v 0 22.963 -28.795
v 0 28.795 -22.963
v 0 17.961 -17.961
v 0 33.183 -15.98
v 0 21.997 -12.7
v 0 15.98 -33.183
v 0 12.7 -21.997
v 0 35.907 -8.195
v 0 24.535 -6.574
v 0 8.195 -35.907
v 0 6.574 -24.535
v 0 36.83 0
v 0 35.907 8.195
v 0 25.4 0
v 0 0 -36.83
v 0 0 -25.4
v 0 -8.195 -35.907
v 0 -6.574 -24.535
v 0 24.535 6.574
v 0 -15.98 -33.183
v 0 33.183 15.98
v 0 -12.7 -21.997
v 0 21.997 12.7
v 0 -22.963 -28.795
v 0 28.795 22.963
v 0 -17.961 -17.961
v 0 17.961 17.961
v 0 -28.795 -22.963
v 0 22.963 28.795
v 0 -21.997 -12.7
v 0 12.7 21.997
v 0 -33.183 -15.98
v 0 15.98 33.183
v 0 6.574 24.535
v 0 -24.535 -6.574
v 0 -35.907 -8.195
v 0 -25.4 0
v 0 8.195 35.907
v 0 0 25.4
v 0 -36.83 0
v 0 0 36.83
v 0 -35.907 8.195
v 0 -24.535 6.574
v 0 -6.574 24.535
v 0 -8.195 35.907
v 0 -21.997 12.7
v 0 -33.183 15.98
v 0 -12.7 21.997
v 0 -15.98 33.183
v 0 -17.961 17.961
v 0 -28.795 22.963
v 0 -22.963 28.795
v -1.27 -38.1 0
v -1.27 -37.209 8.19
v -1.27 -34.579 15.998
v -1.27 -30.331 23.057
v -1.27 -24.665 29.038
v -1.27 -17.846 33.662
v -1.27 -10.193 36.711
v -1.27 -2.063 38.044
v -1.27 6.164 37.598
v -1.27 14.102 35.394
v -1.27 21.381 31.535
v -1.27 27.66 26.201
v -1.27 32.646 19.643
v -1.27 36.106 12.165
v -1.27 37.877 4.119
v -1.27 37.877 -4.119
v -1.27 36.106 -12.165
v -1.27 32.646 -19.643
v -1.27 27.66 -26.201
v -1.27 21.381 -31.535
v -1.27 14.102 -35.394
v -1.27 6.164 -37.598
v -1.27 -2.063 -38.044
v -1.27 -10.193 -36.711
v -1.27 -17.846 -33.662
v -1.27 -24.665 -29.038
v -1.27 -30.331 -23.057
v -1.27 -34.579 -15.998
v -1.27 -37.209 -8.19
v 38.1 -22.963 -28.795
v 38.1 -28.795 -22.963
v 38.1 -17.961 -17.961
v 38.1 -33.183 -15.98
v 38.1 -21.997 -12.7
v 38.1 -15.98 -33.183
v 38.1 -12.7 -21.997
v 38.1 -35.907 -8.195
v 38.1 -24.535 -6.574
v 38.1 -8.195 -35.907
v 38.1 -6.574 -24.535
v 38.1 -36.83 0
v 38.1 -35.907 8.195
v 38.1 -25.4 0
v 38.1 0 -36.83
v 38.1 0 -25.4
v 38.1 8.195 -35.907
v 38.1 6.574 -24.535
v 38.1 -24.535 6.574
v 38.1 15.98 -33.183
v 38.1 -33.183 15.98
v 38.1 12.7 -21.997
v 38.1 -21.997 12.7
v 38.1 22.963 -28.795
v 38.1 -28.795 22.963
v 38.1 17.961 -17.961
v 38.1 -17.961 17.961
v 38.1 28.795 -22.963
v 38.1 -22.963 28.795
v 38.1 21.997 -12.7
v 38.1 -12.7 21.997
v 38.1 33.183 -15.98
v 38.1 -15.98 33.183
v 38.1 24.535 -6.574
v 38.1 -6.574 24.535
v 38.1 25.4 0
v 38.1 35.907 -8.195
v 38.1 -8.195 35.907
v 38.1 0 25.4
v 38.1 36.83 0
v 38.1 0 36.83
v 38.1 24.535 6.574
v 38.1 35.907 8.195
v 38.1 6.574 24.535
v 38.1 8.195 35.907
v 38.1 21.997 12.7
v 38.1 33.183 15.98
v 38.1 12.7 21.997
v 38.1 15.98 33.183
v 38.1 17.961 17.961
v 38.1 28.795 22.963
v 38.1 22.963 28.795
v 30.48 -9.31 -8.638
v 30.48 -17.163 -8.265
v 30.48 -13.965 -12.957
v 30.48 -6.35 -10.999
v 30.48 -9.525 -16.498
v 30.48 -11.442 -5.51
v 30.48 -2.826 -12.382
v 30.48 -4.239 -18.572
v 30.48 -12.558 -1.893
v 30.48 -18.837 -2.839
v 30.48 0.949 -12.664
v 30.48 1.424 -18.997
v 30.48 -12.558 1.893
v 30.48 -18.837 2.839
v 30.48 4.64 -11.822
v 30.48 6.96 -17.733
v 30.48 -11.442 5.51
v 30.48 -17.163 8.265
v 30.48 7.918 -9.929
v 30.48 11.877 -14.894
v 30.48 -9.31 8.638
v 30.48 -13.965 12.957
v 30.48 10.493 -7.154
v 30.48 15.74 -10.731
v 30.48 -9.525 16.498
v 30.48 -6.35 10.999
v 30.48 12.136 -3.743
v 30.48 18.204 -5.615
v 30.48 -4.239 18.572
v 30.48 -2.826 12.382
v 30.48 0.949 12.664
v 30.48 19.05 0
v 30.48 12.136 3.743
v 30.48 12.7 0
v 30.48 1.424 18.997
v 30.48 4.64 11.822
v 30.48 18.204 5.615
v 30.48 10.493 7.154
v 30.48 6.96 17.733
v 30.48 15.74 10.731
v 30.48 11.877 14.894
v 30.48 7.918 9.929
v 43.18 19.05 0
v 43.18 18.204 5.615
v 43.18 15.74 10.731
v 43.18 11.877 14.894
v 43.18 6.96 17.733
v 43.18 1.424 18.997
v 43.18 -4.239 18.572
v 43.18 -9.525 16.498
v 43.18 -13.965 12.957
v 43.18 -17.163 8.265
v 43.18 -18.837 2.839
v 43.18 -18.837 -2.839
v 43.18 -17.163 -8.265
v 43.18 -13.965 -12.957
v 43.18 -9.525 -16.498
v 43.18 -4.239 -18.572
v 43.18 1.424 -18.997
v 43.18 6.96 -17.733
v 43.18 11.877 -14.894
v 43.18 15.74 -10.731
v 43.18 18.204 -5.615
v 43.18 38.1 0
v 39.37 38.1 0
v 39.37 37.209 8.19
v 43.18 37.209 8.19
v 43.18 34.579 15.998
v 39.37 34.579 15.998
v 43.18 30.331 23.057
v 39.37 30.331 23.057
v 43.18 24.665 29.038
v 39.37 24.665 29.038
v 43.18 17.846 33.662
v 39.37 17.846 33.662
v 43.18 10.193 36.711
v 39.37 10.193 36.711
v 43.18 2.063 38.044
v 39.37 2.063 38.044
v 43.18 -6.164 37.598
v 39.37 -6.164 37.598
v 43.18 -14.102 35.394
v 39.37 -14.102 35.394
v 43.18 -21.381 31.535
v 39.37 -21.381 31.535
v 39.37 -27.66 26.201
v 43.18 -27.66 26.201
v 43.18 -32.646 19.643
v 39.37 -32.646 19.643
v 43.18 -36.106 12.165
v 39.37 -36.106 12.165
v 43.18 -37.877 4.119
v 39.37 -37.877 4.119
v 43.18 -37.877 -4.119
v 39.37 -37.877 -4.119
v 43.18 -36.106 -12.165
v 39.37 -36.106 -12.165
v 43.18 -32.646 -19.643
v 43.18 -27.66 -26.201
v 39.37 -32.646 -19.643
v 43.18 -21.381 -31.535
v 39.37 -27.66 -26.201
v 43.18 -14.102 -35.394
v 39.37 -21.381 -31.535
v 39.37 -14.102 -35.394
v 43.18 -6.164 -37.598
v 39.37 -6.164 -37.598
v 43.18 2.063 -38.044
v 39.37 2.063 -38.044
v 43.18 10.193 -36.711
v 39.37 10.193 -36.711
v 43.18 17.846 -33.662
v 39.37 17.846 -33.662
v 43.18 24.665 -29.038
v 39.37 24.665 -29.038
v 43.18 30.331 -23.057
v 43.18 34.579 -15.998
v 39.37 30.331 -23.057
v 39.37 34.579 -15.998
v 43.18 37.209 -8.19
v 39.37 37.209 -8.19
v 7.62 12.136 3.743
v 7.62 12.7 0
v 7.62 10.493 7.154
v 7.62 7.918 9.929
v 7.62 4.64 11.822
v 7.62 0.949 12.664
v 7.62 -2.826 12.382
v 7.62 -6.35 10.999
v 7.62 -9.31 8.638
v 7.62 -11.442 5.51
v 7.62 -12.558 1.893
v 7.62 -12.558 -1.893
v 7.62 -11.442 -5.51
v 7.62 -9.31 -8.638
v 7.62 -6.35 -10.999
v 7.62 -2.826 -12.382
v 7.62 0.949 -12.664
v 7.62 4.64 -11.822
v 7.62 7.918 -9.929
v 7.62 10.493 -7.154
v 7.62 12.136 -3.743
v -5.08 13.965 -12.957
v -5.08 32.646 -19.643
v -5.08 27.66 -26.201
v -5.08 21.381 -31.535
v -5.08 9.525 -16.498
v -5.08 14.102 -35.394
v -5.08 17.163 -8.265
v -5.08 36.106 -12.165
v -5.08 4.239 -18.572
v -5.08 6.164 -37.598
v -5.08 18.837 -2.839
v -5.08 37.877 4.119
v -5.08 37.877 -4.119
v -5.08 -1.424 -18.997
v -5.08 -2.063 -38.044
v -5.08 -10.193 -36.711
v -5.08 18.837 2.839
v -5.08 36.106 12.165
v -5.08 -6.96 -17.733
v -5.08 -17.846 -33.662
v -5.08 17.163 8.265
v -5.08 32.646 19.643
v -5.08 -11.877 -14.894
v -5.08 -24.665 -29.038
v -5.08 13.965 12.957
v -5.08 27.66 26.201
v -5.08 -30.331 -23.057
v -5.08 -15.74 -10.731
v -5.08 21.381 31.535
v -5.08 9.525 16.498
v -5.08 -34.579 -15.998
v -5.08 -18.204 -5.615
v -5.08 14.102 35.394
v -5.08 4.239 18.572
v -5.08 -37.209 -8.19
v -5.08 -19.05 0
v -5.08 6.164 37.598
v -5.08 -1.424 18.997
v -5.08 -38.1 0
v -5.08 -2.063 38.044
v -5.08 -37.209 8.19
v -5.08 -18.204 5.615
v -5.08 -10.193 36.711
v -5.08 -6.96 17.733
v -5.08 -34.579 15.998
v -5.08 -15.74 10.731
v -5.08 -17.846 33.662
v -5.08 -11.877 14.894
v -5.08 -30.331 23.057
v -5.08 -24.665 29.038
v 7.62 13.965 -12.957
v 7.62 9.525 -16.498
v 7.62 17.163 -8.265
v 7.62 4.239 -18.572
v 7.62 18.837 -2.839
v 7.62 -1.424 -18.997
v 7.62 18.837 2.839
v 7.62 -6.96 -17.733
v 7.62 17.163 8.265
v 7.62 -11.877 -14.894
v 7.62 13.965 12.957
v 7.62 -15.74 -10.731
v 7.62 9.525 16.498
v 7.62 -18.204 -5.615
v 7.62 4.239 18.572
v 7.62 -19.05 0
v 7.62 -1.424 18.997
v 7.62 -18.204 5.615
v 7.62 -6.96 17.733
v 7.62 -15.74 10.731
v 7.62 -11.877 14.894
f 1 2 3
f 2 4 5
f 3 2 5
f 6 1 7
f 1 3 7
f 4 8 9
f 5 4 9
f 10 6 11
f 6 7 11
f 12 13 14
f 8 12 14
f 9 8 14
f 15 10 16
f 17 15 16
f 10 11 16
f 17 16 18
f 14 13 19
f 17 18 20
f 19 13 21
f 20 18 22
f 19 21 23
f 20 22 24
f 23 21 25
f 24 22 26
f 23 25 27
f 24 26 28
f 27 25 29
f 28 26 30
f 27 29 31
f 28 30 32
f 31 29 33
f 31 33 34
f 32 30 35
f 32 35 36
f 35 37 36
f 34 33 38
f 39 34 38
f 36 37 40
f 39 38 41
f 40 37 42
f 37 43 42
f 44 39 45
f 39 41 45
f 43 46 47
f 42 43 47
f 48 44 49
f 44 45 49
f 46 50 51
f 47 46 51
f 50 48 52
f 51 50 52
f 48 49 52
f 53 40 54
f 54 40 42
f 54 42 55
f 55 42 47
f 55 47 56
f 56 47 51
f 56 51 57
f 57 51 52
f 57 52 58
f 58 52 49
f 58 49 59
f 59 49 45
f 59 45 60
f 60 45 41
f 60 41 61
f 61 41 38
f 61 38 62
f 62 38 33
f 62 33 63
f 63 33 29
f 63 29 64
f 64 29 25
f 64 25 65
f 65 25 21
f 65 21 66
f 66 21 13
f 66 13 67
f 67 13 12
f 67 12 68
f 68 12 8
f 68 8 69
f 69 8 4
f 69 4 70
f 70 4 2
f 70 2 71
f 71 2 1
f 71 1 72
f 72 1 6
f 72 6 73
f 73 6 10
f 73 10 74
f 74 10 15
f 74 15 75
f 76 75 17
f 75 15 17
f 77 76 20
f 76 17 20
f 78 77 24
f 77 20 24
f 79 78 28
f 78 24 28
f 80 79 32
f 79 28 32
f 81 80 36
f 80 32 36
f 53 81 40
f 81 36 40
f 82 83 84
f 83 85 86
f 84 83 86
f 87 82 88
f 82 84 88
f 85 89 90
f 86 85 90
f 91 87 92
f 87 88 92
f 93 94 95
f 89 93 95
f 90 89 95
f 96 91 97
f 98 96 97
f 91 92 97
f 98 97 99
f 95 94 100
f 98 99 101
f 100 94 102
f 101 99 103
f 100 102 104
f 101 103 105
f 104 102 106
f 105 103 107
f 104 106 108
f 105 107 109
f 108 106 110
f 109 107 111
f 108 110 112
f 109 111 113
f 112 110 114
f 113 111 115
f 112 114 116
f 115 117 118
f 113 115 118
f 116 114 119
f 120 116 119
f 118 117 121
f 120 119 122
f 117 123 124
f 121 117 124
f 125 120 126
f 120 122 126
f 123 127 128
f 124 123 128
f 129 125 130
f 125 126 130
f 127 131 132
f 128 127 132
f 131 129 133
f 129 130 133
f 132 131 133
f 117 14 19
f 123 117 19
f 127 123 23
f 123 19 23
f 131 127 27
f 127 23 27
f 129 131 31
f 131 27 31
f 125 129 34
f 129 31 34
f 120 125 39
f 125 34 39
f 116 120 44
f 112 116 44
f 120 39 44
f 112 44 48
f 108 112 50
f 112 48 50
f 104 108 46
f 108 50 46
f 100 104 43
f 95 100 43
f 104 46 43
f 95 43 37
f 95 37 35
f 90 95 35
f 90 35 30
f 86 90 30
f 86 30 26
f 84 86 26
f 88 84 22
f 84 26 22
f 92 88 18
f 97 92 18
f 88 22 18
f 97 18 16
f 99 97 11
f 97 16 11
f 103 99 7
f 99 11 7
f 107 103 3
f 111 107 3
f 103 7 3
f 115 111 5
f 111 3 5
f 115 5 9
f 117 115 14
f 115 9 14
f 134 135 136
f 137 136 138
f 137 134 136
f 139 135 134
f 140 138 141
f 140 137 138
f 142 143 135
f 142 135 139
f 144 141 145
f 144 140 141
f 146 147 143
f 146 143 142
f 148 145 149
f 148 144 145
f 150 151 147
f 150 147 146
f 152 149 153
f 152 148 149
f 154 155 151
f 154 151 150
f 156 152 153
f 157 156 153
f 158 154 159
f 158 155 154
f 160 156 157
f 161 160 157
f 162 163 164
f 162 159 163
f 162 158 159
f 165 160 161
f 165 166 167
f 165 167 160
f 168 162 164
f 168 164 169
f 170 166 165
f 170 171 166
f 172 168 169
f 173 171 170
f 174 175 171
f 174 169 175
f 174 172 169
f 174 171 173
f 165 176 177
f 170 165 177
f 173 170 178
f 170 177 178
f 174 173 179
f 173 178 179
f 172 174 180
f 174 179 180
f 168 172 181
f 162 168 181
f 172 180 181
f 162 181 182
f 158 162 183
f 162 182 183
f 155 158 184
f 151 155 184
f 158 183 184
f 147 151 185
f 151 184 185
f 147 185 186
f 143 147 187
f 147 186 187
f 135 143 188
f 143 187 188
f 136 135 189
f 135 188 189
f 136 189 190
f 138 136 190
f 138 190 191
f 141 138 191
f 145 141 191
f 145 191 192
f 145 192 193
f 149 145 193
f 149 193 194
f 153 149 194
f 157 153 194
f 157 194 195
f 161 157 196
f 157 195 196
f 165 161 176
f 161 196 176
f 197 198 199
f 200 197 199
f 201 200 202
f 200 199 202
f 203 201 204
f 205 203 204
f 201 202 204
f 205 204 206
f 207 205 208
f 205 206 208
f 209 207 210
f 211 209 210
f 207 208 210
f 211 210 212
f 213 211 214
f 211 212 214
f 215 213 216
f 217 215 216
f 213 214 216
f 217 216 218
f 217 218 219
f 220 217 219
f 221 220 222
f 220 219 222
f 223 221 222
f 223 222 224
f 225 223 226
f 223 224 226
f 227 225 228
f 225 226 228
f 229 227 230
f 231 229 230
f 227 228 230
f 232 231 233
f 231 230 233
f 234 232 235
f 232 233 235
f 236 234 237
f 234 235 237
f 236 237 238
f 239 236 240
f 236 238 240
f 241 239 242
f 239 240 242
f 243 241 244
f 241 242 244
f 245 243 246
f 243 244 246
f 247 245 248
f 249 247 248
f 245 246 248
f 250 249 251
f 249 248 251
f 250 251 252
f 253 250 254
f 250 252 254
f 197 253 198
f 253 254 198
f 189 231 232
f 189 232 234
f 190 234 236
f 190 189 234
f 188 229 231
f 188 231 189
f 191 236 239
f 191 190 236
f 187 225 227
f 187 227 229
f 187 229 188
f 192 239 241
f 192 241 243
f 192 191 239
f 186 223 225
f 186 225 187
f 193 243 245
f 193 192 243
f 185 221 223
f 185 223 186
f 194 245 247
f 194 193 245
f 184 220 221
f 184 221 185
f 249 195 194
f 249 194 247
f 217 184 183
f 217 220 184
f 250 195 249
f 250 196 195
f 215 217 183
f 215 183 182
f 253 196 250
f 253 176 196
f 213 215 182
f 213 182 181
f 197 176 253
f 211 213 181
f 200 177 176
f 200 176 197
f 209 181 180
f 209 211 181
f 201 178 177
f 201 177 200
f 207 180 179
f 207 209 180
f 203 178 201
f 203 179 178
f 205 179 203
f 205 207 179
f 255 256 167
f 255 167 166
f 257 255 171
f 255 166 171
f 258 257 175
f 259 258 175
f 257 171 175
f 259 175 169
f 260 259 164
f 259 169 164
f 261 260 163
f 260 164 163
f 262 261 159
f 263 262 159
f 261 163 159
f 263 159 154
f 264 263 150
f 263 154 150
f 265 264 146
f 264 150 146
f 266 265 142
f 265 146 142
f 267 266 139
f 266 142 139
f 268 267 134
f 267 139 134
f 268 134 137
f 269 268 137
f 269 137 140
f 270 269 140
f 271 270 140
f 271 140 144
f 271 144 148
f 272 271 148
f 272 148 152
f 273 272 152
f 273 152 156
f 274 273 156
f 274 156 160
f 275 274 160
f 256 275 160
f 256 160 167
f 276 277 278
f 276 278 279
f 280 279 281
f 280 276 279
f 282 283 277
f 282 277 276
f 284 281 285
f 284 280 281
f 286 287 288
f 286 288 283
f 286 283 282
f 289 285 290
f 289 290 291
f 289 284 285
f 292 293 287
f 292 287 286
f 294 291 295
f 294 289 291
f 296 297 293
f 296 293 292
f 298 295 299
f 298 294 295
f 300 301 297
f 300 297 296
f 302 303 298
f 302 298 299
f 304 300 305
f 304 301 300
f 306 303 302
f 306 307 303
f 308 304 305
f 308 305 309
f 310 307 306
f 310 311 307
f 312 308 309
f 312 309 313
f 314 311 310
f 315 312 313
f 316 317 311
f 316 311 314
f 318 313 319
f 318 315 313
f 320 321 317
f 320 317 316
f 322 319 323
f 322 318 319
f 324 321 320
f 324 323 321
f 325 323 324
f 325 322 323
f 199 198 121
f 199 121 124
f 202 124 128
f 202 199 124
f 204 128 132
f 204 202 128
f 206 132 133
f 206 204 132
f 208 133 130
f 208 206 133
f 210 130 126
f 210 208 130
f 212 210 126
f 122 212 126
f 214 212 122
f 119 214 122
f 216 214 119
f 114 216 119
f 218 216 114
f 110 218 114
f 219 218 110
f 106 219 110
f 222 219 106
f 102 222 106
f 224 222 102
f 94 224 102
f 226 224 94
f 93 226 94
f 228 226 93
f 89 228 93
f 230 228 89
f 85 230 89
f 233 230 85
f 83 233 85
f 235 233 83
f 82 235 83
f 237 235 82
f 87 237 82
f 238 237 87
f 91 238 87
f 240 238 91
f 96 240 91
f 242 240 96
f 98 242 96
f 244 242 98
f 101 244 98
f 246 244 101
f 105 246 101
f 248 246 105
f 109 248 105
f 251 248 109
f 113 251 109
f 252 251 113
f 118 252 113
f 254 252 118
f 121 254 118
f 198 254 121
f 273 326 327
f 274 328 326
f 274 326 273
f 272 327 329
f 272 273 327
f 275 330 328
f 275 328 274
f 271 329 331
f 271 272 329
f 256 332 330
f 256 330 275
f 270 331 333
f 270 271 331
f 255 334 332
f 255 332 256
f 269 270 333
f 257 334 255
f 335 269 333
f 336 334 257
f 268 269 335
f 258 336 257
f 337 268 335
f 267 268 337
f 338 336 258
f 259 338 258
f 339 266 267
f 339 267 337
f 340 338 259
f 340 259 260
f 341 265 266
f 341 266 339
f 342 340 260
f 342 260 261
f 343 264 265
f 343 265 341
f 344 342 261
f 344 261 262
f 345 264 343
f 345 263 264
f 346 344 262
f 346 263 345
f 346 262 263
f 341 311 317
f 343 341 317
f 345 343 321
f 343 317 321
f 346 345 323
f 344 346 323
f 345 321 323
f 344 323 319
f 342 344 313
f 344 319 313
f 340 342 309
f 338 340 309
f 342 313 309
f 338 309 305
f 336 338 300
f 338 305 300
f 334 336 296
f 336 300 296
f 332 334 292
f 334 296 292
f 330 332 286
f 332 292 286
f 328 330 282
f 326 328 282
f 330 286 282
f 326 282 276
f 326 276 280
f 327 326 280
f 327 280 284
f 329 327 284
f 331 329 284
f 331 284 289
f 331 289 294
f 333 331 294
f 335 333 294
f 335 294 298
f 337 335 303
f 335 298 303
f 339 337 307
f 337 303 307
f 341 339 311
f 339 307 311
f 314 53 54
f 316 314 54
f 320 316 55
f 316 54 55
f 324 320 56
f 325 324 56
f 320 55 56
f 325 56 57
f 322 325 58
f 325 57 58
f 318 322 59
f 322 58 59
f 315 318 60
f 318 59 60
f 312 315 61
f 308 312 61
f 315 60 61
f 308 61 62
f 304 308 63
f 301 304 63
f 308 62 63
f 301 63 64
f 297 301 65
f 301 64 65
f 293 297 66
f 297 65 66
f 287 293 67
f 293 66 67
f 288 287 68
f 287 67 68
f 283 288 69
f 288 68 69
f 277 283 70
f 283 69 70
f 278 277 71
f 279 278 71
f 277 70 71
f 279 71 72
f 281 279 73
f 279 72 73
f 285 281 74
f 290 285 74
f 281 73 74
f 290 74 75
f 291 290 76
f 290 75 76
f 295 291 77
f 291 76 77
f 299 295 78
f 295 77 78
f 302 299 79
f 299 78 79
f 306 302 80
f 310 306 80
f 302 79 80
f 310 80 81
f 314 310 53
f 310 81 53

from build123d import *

# Parameters (mm, degrees)
F0_R      = 25.4
F1_DEPTH  = 38.1
F2_R      = 38.1
F2_R_2    = 25.4
F3_DEPTH  = 5.08
F4_R      = 38.1
F5_DEPTH  = 5.08
F6_R      = 19.05
F3_FACE_R = 38.1
F7_DEPTH  = 12.7
F8_R      = 19.05
F9_DEPTH  = 12.7
F10_R     = 12.7
F11_DEPTH = 35.561
F12_SIZE  = 1.27


with BuildPart() as f1:
    # F0 (on Right) → F1 (new body)
    with BuildSketch(Plane.YZ):
        Circle(F0_R)
    extrude(amount=F1_DEPTH)

    # F2 (on face) → F3 (join)
    with BuildSketch(Plane.YZ.offset(38.1)):
        Circle(F2_R)
        Circle(F2_R_2, mode=Mode.SUBTRACT)
        Circle(F2_R_2)
    extrude(amount=F3_DEPTH)

    # F4 (on face) → F5 (join)
    with BuildSketch(Plane(origin=(0, 0, 0), x_dir=(0, -1, 0), z_dir=(-1, 0, 0))):
        Circle(F4_R)
    extrude(amount=F5_DEPTH)

    # F6 (on face) + F3_face (on face) → F7 (cut)
    with BuildSketch(Plane(origin=(-5.08, 0, 0), x_dir=(0, -1, 0), z_dir=(-1, 0, 0))):
        Circle(F6_R)
    with BuildSketch(Plane.YZ.offset(43.18)):
        Circle(F3_FACE_R)
    extrude(amount=-F7_DEPTH, dir=(-1, 0, 0), mode=Mode.SUBTRACT)

    # F8 (on face) → F9 (cut)
    with BuildSketch(Plane.YZ.offset(43.18)):
        Circle(F8_R)
    extrude(amount=-F9_DEPTH, mode=Mode.SUBTRACT)

    # F10 (on face) → F11 (cut, through all)
    with BuildSketch(Plane.YZ.offset(30.48)):
        Circle(F10_R)
    extrude(amount=-F11_DEPTH, mode=Mode.SUBTRACT)

    # F12
    f12_edges = [f1.edges().sort_by_distance(p)[0] for p in [
        (0, 38.1, 0),
        (38.1, -38.1, 0),
    ]]
    chamfer(f12_edges, length=F12_SIZE)


solid = f1.part
